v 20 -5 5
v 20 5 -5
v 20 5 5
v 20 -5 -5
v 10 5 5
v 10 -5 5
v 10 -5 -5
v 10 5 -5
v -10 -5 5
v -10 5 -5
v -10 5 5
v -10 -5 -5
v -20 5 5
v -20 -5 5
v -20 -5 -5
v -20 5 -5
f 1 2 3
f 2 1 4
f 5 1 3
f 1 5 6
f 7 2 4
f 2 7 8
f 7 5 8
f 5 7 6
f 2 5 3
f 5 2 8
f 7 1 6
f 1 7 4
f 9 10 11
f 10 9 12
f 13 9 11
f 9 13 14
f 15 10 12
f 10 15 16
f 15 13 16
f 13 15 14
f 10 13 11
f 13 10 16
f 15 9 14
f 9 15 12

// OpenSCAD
include <constructive-compiled.scad>

two() X(sides(15))  box(10);
